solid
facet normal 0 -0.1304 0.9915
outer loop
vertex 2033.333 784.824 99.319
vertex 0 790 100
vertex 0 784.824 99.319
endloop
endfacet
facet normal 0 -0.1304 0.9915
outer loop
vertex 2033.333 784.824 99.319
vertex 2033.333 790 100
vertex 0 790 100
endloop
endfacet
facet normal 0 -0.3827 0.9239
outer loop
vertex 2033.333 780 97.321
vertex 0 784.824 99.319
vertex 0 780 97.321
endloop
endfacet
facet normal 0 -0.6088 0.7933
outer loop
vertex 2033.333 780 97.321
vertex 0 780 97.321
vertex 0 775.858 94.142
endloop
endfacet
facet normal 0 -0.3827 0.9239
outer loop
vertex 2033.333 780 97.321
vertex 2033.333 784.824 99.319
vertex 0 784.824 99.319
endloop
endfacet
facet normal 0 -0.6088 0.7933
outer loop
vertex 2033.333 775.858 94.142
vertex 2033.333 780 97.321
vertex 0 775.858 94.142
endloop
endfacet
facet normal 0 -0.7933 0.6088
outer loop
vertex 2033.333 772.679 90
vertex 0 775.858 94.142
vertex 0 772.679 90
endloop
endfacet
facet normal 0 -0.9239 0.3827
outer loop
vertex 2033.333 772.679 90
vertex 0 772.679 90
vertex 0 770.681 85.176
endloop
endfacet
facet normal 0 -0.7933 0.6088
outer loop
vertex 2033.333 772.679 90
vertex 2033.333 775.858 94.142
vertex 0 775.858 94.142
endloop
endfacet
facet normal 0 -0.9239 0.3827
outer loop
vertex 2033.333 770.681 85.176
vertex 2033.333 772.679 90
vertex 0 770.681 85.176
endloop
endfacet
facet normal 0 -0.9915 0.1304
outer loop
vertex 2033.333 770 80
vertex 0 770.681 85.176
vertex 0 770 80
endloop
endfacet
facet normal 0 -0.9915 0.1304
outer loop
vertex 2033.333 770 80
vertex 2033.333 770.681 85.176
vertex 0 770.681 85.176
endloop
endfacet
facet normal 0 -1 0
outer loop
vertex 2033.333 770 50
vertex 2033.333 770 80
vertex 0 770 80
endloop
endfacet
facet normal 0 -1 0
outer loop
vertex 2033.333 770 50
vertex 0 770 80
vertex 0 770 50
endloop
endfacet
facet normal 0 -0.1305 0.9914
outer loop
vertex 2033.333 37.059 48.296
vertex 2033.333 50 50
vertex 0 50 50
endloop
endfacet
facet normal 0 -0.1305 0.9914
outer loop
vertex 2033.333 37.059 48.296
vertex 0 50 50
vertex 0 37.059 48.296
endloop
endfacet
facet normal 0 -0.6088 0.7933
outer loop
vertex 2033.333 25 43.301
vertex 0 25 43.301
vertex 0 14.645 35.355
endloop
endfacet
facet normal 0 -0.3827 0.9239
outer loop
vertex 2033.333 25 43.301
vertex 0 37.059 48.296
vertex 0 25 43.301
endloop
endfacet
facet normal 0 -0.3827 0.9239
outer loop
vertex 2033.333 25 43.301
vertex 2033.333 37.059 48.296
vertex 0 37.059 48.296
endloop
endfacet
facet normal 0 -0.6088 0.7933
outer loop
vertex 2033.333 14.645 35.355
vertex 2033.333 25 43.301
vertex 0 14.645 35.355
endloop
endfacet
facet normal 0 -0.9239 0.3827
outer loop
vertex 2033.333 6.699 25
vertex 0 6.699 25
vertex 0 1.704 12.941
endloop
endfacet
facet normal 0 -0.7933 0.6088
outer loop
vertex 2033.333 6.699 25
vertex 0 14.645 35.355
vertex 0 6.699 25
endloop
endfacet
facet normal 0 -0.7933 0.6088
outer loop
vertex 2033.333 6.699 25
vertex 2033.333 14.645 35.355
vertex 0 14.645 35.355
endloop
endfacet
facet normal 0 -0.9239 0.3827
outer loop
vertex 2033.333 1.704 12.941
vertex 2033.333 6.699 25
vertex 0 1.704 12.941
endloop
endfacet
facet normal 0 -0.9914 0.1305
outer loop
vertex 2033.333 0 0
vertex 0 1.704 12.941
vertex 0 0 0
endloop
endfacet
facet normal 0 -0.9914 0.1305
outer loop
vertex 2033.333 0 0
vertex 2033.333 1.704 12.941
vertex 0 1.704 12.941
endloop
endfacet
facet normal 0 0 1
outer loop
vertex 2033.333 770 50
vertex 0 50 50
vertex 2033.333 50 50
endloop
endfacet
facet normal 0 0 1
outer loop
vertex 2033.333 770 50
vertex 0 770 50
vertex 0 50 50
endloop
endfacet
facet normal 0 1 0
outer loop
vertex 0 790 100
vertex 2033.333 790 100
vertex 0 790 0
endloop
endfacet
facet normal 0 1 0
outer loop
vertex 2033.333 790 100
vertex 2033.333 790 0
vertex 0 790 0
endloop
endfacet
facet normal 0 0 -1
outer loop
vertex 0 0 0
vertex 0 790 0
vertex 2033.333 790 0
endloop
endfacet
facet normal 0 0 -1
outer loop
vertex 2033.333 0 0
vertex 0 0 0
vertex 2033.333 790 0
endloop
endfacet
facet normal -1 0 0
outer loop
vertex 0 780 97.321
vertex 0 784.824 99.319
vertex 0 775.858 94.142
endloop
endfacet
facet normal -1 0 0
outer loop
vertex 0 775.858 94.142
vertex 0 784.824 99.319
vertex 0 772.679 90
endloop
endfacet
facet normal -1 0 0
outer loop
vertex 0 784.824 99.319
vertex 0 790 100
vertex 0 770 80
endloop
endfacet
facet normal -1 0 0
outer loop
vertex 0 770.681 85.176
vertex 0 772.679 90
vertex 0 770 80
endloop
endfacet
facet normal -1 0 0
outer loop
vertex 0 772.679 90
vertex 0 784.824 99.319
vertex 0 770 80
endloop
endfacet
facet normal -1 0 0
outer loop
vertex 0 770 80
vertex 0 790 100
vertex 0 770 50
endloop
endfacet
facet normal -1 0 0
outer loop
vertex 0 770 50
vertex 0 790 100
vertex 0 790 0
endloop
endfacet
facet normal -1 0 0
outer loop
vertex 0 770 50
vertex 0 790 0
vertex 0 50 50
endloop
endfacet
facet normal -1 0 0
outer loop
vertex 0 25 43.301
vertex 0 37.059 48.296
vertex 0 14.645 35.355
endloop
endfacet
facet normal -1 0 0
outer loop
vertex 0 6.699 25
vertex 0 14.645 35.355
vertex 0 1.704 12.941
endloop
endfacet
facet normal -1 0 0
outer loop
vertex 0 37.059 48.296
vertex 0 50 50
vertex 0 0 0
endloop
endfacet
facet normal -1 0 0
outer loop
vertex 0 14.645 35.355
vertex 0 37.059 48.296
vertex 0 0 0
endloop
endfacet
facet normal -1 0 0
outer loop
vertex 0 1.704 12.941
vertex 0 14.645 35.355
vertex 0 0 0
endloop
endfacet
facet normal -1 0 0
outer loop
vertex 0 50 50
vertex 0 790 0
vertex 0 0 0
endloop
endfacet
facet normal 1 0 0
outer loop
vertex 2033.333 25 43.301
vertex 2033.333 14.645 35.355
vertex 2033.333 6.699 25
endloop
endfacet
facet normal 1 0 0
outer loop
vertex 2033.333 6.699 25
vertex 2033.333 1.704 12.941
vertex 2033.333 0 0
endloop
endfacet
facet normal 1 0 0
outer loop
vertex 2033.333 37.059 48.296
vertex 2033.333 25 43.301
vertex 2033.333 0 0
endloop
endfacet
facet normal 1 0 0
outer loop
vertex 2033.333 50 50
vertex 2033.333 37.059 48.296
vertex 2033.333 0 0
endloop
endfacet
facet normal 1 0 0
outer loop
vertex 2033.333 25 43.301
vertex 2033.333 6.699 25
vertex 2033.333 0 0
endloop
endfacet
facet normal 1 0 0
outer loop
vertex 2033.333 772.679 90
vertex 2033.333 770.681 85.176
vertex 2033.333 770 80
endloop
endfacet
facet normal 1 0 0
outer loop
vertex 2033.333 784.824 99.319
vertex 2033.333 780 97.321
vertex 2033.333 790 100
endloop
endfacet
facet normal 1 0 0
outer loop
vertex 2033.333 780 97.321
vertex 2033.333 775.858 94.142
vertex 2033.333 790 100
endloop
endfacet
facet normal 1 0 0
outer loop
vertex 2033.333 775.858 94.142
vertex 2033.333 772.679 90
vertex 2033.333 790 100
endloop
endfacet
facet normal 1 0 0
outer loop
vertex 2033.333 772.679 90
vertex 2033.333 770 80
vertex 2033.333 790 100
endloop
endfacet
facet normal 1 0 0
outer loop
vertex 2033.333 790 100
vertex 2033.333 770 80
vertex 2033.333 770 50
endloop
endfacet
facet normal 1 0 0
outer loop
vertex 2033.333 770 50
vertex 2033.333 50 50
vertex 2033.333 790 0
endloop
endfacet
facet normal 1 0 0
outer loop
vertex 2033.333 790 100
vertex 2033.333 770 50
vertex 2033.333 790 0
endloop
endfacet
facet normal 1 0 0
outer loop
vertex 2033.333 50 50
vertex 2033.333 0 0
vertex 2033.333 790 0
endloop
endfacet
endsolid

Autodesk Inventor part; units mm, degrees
ref_plane "YZ Plane" through (0, 0, 0) normal (1, 0, 0) x (0, 1, 0)
ref_plane "XZ Plane" through (0, 0, 0) normal (0, 1, 0) x (-1, 0, 0)
ref_plane "XY Plane" through (0, 0, 0) normal (0, 0, 1) x (1, 0, 0)
sketch "Sketch1" plane through (0, 0, 0) normal (0, 0, 1) x (1, 0, 0)
  line L0 (0, 0) -> (2033.3333, 0)
  line L1 (2033.3333, 0) -> (2033.3333, 790)
  line L2 (2033.3333, 790) -> (0, 790)
  line L3 (0, 790) -> (0, 0)
  dimension "ancho" = 2033.3333
  dimension "d1" = 790
extrude "Extrusion1" add sketch "Sketch1" along normal blind 50
fillet "Fillet1" radius 50 1 edges at (1016.6667, 0, 50)
sketch "Sketch2" plane through (2033.3333, 790, 50) normal (1, 0, 0) x (0, 0, -1)
  line L0 (50, 0) -> (-50, 0)
  line L1 (-50, 0) -> (-50, 0)
  line L2 (-30, -20) -> (50, -20)
  line L3 (50, -20) -> (50, 0)
  arc A0 (-50, 0) -> (-30, -20) centre (-30, 0) ccw
  point P0 (50, -790)
  point P1 (-50, -20)
  dimension "d5" = 100
  dimension "d6" = 20
  dimension "d7" = 20
extrude "Extrusion2" add sketch "Sketch2" against normal up to surface (2033.3333 mm away)
properties part number "meson"
